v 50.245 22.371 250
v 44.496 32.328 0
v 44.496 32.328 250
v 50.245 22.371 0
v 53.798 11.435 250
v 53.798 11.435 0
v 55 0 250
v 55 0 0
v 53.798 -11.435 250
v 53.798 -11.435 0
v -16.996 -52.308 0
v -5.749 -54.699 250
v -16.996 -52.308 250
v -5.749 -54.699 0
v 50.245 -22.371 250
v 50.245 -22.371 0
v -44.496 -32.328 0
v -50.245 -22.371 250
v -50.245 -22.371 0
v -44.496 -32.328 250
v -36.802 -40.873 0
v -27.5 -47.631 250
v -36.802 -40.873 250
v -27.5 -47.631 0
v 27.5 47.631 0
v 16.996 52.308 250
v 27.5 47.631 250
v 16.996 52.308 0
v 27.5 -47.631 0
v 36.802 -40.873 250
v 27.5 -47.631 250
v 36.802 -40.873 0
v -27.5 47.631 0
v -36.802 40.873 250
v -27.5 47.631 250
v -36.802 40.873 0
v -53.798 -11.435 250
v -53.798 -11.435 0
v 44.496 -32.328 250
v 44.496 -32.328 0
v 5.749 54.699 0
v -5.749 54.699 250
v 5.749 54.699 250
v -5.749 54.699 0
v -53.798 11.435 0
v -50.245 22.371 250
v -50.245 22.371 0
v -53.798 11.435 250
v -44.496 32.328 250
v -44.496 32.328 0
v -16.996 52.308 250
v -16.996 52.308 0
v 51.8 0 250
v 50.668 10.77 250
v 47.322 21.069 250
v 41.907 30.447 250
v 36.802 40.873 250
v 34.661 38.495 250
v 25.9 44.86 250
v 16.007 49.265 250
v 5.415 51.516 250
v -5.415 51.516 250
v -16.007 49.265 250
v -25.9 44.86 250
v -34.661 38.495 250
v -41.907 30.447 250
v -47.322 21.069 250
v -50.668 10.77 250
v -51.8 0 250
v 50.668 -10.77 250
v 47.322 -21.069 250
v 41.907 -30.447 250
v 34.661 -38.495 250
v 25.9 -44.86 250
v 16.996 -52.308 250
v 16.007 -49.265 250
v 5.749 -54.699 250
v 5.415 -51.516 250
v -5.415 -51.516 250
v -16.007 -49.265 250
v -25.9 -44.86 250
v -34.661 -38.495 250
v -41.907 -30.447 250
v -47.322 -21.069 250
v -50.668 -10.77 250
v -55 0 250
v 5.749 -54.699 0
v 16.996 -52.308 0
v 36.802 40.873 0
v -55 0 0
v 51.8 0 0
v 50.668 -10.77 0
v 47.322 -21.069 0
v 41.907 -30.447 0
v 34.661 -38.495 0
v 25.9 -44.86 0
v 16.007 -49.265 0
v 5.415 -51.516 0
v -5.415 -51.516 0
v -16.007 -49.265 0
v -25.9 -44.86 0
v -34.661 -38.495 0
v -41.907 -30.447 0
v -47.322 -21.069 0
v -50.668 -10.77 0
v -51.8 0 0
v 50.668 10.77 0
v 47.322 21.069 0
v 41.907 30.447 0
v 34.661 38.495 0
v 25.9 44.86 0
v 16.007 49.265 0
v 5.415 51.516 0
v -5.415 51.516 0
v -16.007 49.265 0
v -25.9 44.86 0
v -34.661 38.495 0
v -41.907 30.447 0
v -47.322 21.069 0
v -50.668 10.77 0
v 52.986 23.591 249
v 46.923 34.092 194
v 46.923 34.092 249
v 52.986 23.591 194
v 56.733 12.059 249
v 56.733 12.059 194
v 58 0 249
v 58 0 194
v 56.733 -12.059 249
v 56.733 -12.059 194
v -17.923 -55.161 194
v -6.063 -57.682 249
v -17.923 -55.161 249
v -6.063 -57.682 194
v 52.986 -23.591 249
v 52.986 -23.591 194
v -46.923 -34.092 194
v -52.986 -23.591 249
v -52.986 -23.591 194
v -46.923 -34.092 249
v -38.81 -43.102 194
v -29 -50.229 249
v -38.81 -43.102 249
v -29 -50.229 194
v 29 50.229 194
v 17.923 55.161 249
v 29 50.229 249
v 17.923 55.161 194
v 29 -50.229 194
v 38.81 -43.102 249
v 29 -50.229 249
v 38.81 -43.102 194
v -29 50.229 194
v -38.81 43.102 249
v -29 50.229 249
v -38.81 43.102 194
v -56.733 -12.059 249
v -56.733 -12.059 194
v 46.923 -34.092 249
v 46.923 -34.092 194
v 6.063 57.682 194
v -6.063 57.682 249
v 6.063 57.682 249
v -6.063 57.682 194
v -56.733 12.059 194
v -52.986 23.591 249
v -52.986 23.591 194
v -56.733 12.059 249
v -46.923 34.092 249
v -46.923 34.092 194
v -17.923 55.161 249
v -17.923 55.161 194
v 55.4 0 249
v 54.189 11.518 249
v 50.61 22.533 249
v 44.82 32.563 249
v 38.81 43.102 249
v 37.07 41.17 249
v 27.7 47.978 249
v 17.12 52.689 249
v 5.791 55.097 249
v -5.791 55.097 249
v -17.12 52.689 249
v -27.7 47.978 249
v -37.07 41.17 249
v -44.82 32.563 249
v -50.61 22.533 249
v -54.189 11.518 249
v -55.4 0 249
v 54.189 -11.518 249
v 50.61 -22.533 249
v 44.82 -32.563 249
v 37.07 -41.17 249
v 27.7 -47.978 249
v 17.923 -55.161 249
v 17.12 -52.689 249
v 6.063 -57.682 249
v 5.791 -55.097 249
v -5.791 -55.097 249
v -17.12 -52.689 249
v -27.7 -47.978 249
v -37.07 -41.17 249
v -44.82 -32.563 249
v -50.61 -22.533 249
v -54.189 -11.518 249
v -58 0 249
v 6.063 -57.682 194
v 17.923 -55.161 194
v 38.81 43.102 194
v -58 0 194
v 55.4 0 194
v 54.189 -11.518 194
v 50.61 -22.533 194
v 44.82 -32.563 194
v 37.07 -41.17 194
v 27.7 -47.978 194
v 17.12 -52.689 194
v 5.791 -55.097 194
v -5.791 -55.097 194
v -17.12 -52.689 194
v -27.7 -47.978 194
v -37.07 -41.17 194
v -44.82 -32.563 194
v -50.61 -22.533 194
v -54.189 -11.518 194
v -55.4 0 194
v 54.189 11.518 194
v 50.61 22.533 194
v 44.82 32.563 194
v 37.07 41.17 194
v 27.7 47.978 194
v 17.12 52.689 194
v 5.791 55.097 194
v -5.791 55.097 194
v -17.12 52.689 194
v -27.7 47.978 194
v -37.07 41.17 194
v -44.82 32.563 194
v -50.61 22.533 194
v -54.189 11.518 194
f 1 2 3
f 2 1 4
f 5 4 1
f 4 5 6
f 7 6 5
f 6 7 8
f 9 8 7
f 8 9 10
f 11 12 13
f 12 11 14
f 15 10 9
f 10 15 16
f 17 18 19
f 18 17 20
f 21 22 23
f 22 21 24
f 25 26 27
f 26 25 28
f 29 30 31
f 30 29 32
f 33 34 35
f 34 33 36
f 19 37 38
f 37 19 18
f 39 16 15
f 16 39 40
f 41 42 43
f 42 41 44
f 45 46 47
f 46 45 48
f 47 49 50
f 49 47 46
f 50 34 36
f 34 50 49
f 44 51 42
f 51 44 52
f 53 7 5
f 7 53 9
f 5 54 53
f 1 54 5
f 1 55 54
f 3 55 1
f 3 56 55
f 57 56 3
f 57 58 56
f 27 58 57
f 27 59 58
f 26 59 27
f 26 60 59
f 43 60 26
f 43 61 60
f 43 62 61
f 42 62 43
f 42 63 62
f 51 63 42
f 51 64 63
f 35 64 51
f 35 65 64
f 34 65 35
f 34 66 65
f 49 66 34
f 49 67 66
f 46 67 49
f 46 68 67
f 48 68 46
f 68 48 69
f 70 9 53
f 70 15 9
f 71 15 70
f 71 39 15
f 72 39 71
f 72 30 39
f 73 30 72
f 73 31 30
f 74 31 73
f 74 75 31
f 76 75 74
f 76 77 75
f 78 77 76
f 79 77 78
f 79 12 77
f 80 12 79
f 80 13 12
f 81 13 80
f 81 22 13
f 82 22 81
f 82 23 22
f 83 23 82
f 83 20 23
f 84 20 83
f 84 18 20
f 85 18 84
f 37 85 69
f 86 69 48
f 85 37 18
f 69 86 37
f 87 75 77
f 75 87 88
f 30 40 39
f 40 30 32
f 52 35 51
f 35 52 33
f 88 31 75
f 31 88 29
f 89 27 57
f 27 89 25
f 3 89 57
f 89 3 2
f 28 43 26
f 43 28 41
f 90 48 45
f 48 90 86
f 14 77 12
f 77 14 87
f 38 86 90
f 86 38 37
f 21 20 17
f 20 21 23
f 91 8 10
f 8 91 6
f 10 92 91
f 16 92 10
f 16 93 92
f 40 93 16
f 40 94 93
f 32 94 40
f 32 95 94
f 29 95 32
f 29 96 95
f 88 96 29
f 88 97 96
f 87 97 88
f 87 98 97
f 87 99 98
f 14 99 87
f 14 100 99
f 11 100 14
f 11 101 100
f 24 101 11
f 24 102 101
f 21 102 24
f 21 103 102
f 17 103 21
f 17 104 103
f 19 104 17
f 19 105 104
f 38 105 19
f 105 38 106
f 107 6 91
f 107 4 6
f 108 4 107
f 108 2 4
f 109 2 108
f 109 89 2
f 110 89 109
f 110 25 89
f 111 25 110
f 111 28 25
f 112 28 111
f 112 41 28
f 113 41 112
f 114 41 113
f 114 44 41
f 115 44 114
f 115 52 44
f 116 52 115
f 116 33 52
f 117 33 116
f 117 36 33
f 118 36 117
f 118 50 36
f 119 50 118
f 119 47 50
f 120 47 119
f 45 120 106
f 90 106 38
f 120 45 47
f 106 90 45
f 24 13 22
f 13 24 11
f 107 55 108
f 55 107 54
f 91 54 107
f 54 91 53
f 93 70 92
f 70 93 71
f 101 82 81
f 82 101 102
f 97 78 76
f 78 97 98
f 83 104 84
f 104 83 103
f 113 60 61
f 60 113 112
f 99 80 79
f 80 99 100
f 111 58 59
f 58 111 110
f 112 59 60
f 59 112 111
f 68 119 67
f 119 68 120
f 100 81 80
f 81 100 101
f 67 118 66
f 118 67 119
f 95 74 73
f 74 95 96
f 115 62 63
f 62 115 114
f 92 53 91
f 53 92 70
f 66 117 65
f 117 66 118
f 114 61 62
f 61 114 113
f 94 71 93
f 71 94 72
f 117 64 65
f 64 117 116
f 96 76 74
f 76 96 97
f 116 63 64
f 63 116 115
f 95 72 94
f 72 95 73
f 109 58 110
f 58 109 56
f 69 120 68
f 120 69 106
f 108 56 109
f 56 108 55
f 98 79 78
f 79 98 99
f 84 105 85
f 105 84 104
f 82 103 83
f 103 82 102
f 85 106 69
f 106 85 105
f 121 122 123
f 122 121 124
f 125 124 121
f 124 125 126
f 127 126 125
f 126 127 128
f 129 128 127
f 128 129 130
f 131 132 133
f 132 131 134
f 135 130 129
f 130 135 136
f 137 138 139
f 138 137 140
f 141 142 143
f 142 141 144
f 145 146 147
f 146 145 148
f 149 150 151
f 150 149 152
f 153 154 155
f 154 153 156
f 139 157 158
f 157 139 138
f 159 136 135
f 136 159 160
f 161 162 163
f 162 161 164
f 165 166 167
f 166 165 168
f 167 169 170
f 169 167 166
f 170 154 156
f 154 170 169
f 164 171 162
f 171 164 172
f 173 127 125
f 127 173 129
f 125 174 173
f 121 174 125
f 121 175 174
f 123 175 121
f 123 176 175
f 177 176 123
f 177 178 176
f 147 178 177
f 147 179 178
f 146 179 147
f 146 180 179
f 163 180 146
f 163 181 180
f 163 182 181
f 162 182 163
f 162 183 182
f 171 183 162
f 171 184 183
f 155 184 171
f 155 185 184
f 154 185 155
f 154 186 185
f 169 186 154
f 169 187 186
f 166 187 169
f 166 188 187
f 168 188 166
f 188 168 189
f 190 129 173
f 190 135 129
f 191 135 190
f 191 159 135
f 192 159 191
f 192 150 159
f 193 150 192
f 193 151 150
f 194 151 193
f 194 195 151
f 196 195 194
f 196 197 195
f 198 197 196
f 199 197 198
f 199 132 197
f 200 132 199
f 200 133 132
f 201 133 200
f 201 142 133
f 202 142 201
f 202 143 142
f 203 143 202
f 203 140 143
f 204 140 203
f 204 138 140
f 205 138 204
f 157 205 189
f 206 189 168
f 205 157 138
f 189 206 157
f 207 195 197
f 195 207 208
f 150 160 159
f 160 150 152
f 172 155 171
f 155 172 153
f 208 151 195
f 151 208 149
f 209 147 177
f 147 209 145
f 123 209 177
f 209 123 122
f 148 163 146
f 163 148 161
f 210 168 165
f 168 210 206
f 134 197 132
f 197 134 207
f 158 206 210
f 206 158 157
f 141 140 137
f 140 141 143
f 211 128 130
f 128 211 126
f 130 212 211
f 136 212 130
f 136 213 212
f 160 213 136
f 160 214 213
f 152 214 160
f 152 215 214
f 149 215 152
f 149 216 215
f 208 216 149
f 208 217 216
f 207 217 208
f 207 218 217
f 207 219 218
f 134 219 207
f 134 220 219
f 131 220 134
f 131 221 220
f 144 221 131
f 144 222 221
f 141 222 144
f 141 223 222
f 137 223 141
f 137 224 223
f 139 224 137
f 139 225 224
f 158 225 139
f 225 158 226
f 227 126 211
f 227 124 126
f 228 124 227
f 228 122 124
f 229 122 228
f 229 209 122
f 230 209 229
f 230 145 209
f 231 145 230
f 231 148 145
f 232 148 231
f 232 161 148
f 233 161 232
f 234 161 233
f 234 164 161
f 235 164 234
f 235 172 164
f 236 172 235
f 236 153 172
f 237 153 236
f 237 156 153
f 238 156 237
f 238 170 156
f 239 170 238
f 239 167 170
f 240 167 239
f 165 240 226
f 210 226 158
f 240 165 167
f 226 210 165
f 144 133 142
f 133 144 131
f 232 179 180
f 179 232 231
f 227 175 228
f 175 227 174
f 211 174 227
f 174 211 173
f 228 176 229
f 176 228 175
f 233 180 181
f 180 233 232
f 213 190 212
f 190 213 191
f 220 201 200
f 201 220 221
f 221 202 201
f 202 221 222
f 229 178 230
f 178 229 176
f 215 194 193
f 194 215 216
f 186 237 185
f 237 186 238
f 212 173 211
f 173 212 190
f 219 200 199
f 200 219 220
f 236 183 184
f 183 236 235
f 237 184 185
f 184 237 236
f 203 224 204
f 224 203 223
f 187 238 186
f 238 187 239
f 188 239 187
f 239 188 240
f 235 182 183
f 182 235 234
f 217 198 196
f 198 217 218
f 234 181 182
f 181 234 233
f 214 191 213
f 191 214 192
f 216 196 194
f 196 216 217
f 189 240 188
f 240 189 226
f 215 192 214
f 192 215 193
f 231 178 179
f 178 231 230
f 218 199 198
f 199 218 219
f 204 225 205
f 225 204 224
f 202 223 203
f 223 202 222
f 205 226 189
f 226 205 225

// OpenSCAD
// Parameters
pipe_standard = 0; //[0:1:1]
nominal_diameter_mm = 110; //[55:220:1]
length_mm = 250; //[125:500:1]
pipe_od_mm = 110; //[90:140:0.5]
pipe_wall_mm = 3.2; //[2:6.5:0.1]
socket_length_mm = 55; //[30:90:1]
socket_wall_extra_mm = 2.5; //[1:6:0.1]
socket_od_extra_mm = 6; //[2:14:0.5]
fit_overlap_mm = 1; //[0.5:2:0.1]
clearance_mm = 0.4; //[0.1:1.2:0.05]

// Module for HT Pipe
module ht_pipe() {
  color([0.85, 0.85, 0.8]) {
    // Outer pipe
    difference() {
      cylinder(h=length_mm, r=pipe_od_mm/2, center=false);
      // Inner void
      translate([0, 0, -fit_overlap_mm])
        cylinder(h=length_mm + fit_overlap_mm*2, r=pipe_od_mm/2 - pipe_wall_mm, center=false);
    }
    
    // End fitting socket
    translate([0, 0, length_mm - socket_length_mm - fit_overlap_mm]) {
      difference() {
        cylinder(h=socket_length_mm, r=pipe_od_mm/2 + socket_od_extra_mm/2, center=false);
        // Inner void of socket
        translate([0, 0, -fit_overlap_mm])
          cylinder(h=socket_length_mm + fit_overlap_mm*2, r=pipe_od_mm/2 + clearance_mm, center=false);
      }
    }
  }
}

// Assembly
module assembly() {
  ht_pipe();
}

assembly();
